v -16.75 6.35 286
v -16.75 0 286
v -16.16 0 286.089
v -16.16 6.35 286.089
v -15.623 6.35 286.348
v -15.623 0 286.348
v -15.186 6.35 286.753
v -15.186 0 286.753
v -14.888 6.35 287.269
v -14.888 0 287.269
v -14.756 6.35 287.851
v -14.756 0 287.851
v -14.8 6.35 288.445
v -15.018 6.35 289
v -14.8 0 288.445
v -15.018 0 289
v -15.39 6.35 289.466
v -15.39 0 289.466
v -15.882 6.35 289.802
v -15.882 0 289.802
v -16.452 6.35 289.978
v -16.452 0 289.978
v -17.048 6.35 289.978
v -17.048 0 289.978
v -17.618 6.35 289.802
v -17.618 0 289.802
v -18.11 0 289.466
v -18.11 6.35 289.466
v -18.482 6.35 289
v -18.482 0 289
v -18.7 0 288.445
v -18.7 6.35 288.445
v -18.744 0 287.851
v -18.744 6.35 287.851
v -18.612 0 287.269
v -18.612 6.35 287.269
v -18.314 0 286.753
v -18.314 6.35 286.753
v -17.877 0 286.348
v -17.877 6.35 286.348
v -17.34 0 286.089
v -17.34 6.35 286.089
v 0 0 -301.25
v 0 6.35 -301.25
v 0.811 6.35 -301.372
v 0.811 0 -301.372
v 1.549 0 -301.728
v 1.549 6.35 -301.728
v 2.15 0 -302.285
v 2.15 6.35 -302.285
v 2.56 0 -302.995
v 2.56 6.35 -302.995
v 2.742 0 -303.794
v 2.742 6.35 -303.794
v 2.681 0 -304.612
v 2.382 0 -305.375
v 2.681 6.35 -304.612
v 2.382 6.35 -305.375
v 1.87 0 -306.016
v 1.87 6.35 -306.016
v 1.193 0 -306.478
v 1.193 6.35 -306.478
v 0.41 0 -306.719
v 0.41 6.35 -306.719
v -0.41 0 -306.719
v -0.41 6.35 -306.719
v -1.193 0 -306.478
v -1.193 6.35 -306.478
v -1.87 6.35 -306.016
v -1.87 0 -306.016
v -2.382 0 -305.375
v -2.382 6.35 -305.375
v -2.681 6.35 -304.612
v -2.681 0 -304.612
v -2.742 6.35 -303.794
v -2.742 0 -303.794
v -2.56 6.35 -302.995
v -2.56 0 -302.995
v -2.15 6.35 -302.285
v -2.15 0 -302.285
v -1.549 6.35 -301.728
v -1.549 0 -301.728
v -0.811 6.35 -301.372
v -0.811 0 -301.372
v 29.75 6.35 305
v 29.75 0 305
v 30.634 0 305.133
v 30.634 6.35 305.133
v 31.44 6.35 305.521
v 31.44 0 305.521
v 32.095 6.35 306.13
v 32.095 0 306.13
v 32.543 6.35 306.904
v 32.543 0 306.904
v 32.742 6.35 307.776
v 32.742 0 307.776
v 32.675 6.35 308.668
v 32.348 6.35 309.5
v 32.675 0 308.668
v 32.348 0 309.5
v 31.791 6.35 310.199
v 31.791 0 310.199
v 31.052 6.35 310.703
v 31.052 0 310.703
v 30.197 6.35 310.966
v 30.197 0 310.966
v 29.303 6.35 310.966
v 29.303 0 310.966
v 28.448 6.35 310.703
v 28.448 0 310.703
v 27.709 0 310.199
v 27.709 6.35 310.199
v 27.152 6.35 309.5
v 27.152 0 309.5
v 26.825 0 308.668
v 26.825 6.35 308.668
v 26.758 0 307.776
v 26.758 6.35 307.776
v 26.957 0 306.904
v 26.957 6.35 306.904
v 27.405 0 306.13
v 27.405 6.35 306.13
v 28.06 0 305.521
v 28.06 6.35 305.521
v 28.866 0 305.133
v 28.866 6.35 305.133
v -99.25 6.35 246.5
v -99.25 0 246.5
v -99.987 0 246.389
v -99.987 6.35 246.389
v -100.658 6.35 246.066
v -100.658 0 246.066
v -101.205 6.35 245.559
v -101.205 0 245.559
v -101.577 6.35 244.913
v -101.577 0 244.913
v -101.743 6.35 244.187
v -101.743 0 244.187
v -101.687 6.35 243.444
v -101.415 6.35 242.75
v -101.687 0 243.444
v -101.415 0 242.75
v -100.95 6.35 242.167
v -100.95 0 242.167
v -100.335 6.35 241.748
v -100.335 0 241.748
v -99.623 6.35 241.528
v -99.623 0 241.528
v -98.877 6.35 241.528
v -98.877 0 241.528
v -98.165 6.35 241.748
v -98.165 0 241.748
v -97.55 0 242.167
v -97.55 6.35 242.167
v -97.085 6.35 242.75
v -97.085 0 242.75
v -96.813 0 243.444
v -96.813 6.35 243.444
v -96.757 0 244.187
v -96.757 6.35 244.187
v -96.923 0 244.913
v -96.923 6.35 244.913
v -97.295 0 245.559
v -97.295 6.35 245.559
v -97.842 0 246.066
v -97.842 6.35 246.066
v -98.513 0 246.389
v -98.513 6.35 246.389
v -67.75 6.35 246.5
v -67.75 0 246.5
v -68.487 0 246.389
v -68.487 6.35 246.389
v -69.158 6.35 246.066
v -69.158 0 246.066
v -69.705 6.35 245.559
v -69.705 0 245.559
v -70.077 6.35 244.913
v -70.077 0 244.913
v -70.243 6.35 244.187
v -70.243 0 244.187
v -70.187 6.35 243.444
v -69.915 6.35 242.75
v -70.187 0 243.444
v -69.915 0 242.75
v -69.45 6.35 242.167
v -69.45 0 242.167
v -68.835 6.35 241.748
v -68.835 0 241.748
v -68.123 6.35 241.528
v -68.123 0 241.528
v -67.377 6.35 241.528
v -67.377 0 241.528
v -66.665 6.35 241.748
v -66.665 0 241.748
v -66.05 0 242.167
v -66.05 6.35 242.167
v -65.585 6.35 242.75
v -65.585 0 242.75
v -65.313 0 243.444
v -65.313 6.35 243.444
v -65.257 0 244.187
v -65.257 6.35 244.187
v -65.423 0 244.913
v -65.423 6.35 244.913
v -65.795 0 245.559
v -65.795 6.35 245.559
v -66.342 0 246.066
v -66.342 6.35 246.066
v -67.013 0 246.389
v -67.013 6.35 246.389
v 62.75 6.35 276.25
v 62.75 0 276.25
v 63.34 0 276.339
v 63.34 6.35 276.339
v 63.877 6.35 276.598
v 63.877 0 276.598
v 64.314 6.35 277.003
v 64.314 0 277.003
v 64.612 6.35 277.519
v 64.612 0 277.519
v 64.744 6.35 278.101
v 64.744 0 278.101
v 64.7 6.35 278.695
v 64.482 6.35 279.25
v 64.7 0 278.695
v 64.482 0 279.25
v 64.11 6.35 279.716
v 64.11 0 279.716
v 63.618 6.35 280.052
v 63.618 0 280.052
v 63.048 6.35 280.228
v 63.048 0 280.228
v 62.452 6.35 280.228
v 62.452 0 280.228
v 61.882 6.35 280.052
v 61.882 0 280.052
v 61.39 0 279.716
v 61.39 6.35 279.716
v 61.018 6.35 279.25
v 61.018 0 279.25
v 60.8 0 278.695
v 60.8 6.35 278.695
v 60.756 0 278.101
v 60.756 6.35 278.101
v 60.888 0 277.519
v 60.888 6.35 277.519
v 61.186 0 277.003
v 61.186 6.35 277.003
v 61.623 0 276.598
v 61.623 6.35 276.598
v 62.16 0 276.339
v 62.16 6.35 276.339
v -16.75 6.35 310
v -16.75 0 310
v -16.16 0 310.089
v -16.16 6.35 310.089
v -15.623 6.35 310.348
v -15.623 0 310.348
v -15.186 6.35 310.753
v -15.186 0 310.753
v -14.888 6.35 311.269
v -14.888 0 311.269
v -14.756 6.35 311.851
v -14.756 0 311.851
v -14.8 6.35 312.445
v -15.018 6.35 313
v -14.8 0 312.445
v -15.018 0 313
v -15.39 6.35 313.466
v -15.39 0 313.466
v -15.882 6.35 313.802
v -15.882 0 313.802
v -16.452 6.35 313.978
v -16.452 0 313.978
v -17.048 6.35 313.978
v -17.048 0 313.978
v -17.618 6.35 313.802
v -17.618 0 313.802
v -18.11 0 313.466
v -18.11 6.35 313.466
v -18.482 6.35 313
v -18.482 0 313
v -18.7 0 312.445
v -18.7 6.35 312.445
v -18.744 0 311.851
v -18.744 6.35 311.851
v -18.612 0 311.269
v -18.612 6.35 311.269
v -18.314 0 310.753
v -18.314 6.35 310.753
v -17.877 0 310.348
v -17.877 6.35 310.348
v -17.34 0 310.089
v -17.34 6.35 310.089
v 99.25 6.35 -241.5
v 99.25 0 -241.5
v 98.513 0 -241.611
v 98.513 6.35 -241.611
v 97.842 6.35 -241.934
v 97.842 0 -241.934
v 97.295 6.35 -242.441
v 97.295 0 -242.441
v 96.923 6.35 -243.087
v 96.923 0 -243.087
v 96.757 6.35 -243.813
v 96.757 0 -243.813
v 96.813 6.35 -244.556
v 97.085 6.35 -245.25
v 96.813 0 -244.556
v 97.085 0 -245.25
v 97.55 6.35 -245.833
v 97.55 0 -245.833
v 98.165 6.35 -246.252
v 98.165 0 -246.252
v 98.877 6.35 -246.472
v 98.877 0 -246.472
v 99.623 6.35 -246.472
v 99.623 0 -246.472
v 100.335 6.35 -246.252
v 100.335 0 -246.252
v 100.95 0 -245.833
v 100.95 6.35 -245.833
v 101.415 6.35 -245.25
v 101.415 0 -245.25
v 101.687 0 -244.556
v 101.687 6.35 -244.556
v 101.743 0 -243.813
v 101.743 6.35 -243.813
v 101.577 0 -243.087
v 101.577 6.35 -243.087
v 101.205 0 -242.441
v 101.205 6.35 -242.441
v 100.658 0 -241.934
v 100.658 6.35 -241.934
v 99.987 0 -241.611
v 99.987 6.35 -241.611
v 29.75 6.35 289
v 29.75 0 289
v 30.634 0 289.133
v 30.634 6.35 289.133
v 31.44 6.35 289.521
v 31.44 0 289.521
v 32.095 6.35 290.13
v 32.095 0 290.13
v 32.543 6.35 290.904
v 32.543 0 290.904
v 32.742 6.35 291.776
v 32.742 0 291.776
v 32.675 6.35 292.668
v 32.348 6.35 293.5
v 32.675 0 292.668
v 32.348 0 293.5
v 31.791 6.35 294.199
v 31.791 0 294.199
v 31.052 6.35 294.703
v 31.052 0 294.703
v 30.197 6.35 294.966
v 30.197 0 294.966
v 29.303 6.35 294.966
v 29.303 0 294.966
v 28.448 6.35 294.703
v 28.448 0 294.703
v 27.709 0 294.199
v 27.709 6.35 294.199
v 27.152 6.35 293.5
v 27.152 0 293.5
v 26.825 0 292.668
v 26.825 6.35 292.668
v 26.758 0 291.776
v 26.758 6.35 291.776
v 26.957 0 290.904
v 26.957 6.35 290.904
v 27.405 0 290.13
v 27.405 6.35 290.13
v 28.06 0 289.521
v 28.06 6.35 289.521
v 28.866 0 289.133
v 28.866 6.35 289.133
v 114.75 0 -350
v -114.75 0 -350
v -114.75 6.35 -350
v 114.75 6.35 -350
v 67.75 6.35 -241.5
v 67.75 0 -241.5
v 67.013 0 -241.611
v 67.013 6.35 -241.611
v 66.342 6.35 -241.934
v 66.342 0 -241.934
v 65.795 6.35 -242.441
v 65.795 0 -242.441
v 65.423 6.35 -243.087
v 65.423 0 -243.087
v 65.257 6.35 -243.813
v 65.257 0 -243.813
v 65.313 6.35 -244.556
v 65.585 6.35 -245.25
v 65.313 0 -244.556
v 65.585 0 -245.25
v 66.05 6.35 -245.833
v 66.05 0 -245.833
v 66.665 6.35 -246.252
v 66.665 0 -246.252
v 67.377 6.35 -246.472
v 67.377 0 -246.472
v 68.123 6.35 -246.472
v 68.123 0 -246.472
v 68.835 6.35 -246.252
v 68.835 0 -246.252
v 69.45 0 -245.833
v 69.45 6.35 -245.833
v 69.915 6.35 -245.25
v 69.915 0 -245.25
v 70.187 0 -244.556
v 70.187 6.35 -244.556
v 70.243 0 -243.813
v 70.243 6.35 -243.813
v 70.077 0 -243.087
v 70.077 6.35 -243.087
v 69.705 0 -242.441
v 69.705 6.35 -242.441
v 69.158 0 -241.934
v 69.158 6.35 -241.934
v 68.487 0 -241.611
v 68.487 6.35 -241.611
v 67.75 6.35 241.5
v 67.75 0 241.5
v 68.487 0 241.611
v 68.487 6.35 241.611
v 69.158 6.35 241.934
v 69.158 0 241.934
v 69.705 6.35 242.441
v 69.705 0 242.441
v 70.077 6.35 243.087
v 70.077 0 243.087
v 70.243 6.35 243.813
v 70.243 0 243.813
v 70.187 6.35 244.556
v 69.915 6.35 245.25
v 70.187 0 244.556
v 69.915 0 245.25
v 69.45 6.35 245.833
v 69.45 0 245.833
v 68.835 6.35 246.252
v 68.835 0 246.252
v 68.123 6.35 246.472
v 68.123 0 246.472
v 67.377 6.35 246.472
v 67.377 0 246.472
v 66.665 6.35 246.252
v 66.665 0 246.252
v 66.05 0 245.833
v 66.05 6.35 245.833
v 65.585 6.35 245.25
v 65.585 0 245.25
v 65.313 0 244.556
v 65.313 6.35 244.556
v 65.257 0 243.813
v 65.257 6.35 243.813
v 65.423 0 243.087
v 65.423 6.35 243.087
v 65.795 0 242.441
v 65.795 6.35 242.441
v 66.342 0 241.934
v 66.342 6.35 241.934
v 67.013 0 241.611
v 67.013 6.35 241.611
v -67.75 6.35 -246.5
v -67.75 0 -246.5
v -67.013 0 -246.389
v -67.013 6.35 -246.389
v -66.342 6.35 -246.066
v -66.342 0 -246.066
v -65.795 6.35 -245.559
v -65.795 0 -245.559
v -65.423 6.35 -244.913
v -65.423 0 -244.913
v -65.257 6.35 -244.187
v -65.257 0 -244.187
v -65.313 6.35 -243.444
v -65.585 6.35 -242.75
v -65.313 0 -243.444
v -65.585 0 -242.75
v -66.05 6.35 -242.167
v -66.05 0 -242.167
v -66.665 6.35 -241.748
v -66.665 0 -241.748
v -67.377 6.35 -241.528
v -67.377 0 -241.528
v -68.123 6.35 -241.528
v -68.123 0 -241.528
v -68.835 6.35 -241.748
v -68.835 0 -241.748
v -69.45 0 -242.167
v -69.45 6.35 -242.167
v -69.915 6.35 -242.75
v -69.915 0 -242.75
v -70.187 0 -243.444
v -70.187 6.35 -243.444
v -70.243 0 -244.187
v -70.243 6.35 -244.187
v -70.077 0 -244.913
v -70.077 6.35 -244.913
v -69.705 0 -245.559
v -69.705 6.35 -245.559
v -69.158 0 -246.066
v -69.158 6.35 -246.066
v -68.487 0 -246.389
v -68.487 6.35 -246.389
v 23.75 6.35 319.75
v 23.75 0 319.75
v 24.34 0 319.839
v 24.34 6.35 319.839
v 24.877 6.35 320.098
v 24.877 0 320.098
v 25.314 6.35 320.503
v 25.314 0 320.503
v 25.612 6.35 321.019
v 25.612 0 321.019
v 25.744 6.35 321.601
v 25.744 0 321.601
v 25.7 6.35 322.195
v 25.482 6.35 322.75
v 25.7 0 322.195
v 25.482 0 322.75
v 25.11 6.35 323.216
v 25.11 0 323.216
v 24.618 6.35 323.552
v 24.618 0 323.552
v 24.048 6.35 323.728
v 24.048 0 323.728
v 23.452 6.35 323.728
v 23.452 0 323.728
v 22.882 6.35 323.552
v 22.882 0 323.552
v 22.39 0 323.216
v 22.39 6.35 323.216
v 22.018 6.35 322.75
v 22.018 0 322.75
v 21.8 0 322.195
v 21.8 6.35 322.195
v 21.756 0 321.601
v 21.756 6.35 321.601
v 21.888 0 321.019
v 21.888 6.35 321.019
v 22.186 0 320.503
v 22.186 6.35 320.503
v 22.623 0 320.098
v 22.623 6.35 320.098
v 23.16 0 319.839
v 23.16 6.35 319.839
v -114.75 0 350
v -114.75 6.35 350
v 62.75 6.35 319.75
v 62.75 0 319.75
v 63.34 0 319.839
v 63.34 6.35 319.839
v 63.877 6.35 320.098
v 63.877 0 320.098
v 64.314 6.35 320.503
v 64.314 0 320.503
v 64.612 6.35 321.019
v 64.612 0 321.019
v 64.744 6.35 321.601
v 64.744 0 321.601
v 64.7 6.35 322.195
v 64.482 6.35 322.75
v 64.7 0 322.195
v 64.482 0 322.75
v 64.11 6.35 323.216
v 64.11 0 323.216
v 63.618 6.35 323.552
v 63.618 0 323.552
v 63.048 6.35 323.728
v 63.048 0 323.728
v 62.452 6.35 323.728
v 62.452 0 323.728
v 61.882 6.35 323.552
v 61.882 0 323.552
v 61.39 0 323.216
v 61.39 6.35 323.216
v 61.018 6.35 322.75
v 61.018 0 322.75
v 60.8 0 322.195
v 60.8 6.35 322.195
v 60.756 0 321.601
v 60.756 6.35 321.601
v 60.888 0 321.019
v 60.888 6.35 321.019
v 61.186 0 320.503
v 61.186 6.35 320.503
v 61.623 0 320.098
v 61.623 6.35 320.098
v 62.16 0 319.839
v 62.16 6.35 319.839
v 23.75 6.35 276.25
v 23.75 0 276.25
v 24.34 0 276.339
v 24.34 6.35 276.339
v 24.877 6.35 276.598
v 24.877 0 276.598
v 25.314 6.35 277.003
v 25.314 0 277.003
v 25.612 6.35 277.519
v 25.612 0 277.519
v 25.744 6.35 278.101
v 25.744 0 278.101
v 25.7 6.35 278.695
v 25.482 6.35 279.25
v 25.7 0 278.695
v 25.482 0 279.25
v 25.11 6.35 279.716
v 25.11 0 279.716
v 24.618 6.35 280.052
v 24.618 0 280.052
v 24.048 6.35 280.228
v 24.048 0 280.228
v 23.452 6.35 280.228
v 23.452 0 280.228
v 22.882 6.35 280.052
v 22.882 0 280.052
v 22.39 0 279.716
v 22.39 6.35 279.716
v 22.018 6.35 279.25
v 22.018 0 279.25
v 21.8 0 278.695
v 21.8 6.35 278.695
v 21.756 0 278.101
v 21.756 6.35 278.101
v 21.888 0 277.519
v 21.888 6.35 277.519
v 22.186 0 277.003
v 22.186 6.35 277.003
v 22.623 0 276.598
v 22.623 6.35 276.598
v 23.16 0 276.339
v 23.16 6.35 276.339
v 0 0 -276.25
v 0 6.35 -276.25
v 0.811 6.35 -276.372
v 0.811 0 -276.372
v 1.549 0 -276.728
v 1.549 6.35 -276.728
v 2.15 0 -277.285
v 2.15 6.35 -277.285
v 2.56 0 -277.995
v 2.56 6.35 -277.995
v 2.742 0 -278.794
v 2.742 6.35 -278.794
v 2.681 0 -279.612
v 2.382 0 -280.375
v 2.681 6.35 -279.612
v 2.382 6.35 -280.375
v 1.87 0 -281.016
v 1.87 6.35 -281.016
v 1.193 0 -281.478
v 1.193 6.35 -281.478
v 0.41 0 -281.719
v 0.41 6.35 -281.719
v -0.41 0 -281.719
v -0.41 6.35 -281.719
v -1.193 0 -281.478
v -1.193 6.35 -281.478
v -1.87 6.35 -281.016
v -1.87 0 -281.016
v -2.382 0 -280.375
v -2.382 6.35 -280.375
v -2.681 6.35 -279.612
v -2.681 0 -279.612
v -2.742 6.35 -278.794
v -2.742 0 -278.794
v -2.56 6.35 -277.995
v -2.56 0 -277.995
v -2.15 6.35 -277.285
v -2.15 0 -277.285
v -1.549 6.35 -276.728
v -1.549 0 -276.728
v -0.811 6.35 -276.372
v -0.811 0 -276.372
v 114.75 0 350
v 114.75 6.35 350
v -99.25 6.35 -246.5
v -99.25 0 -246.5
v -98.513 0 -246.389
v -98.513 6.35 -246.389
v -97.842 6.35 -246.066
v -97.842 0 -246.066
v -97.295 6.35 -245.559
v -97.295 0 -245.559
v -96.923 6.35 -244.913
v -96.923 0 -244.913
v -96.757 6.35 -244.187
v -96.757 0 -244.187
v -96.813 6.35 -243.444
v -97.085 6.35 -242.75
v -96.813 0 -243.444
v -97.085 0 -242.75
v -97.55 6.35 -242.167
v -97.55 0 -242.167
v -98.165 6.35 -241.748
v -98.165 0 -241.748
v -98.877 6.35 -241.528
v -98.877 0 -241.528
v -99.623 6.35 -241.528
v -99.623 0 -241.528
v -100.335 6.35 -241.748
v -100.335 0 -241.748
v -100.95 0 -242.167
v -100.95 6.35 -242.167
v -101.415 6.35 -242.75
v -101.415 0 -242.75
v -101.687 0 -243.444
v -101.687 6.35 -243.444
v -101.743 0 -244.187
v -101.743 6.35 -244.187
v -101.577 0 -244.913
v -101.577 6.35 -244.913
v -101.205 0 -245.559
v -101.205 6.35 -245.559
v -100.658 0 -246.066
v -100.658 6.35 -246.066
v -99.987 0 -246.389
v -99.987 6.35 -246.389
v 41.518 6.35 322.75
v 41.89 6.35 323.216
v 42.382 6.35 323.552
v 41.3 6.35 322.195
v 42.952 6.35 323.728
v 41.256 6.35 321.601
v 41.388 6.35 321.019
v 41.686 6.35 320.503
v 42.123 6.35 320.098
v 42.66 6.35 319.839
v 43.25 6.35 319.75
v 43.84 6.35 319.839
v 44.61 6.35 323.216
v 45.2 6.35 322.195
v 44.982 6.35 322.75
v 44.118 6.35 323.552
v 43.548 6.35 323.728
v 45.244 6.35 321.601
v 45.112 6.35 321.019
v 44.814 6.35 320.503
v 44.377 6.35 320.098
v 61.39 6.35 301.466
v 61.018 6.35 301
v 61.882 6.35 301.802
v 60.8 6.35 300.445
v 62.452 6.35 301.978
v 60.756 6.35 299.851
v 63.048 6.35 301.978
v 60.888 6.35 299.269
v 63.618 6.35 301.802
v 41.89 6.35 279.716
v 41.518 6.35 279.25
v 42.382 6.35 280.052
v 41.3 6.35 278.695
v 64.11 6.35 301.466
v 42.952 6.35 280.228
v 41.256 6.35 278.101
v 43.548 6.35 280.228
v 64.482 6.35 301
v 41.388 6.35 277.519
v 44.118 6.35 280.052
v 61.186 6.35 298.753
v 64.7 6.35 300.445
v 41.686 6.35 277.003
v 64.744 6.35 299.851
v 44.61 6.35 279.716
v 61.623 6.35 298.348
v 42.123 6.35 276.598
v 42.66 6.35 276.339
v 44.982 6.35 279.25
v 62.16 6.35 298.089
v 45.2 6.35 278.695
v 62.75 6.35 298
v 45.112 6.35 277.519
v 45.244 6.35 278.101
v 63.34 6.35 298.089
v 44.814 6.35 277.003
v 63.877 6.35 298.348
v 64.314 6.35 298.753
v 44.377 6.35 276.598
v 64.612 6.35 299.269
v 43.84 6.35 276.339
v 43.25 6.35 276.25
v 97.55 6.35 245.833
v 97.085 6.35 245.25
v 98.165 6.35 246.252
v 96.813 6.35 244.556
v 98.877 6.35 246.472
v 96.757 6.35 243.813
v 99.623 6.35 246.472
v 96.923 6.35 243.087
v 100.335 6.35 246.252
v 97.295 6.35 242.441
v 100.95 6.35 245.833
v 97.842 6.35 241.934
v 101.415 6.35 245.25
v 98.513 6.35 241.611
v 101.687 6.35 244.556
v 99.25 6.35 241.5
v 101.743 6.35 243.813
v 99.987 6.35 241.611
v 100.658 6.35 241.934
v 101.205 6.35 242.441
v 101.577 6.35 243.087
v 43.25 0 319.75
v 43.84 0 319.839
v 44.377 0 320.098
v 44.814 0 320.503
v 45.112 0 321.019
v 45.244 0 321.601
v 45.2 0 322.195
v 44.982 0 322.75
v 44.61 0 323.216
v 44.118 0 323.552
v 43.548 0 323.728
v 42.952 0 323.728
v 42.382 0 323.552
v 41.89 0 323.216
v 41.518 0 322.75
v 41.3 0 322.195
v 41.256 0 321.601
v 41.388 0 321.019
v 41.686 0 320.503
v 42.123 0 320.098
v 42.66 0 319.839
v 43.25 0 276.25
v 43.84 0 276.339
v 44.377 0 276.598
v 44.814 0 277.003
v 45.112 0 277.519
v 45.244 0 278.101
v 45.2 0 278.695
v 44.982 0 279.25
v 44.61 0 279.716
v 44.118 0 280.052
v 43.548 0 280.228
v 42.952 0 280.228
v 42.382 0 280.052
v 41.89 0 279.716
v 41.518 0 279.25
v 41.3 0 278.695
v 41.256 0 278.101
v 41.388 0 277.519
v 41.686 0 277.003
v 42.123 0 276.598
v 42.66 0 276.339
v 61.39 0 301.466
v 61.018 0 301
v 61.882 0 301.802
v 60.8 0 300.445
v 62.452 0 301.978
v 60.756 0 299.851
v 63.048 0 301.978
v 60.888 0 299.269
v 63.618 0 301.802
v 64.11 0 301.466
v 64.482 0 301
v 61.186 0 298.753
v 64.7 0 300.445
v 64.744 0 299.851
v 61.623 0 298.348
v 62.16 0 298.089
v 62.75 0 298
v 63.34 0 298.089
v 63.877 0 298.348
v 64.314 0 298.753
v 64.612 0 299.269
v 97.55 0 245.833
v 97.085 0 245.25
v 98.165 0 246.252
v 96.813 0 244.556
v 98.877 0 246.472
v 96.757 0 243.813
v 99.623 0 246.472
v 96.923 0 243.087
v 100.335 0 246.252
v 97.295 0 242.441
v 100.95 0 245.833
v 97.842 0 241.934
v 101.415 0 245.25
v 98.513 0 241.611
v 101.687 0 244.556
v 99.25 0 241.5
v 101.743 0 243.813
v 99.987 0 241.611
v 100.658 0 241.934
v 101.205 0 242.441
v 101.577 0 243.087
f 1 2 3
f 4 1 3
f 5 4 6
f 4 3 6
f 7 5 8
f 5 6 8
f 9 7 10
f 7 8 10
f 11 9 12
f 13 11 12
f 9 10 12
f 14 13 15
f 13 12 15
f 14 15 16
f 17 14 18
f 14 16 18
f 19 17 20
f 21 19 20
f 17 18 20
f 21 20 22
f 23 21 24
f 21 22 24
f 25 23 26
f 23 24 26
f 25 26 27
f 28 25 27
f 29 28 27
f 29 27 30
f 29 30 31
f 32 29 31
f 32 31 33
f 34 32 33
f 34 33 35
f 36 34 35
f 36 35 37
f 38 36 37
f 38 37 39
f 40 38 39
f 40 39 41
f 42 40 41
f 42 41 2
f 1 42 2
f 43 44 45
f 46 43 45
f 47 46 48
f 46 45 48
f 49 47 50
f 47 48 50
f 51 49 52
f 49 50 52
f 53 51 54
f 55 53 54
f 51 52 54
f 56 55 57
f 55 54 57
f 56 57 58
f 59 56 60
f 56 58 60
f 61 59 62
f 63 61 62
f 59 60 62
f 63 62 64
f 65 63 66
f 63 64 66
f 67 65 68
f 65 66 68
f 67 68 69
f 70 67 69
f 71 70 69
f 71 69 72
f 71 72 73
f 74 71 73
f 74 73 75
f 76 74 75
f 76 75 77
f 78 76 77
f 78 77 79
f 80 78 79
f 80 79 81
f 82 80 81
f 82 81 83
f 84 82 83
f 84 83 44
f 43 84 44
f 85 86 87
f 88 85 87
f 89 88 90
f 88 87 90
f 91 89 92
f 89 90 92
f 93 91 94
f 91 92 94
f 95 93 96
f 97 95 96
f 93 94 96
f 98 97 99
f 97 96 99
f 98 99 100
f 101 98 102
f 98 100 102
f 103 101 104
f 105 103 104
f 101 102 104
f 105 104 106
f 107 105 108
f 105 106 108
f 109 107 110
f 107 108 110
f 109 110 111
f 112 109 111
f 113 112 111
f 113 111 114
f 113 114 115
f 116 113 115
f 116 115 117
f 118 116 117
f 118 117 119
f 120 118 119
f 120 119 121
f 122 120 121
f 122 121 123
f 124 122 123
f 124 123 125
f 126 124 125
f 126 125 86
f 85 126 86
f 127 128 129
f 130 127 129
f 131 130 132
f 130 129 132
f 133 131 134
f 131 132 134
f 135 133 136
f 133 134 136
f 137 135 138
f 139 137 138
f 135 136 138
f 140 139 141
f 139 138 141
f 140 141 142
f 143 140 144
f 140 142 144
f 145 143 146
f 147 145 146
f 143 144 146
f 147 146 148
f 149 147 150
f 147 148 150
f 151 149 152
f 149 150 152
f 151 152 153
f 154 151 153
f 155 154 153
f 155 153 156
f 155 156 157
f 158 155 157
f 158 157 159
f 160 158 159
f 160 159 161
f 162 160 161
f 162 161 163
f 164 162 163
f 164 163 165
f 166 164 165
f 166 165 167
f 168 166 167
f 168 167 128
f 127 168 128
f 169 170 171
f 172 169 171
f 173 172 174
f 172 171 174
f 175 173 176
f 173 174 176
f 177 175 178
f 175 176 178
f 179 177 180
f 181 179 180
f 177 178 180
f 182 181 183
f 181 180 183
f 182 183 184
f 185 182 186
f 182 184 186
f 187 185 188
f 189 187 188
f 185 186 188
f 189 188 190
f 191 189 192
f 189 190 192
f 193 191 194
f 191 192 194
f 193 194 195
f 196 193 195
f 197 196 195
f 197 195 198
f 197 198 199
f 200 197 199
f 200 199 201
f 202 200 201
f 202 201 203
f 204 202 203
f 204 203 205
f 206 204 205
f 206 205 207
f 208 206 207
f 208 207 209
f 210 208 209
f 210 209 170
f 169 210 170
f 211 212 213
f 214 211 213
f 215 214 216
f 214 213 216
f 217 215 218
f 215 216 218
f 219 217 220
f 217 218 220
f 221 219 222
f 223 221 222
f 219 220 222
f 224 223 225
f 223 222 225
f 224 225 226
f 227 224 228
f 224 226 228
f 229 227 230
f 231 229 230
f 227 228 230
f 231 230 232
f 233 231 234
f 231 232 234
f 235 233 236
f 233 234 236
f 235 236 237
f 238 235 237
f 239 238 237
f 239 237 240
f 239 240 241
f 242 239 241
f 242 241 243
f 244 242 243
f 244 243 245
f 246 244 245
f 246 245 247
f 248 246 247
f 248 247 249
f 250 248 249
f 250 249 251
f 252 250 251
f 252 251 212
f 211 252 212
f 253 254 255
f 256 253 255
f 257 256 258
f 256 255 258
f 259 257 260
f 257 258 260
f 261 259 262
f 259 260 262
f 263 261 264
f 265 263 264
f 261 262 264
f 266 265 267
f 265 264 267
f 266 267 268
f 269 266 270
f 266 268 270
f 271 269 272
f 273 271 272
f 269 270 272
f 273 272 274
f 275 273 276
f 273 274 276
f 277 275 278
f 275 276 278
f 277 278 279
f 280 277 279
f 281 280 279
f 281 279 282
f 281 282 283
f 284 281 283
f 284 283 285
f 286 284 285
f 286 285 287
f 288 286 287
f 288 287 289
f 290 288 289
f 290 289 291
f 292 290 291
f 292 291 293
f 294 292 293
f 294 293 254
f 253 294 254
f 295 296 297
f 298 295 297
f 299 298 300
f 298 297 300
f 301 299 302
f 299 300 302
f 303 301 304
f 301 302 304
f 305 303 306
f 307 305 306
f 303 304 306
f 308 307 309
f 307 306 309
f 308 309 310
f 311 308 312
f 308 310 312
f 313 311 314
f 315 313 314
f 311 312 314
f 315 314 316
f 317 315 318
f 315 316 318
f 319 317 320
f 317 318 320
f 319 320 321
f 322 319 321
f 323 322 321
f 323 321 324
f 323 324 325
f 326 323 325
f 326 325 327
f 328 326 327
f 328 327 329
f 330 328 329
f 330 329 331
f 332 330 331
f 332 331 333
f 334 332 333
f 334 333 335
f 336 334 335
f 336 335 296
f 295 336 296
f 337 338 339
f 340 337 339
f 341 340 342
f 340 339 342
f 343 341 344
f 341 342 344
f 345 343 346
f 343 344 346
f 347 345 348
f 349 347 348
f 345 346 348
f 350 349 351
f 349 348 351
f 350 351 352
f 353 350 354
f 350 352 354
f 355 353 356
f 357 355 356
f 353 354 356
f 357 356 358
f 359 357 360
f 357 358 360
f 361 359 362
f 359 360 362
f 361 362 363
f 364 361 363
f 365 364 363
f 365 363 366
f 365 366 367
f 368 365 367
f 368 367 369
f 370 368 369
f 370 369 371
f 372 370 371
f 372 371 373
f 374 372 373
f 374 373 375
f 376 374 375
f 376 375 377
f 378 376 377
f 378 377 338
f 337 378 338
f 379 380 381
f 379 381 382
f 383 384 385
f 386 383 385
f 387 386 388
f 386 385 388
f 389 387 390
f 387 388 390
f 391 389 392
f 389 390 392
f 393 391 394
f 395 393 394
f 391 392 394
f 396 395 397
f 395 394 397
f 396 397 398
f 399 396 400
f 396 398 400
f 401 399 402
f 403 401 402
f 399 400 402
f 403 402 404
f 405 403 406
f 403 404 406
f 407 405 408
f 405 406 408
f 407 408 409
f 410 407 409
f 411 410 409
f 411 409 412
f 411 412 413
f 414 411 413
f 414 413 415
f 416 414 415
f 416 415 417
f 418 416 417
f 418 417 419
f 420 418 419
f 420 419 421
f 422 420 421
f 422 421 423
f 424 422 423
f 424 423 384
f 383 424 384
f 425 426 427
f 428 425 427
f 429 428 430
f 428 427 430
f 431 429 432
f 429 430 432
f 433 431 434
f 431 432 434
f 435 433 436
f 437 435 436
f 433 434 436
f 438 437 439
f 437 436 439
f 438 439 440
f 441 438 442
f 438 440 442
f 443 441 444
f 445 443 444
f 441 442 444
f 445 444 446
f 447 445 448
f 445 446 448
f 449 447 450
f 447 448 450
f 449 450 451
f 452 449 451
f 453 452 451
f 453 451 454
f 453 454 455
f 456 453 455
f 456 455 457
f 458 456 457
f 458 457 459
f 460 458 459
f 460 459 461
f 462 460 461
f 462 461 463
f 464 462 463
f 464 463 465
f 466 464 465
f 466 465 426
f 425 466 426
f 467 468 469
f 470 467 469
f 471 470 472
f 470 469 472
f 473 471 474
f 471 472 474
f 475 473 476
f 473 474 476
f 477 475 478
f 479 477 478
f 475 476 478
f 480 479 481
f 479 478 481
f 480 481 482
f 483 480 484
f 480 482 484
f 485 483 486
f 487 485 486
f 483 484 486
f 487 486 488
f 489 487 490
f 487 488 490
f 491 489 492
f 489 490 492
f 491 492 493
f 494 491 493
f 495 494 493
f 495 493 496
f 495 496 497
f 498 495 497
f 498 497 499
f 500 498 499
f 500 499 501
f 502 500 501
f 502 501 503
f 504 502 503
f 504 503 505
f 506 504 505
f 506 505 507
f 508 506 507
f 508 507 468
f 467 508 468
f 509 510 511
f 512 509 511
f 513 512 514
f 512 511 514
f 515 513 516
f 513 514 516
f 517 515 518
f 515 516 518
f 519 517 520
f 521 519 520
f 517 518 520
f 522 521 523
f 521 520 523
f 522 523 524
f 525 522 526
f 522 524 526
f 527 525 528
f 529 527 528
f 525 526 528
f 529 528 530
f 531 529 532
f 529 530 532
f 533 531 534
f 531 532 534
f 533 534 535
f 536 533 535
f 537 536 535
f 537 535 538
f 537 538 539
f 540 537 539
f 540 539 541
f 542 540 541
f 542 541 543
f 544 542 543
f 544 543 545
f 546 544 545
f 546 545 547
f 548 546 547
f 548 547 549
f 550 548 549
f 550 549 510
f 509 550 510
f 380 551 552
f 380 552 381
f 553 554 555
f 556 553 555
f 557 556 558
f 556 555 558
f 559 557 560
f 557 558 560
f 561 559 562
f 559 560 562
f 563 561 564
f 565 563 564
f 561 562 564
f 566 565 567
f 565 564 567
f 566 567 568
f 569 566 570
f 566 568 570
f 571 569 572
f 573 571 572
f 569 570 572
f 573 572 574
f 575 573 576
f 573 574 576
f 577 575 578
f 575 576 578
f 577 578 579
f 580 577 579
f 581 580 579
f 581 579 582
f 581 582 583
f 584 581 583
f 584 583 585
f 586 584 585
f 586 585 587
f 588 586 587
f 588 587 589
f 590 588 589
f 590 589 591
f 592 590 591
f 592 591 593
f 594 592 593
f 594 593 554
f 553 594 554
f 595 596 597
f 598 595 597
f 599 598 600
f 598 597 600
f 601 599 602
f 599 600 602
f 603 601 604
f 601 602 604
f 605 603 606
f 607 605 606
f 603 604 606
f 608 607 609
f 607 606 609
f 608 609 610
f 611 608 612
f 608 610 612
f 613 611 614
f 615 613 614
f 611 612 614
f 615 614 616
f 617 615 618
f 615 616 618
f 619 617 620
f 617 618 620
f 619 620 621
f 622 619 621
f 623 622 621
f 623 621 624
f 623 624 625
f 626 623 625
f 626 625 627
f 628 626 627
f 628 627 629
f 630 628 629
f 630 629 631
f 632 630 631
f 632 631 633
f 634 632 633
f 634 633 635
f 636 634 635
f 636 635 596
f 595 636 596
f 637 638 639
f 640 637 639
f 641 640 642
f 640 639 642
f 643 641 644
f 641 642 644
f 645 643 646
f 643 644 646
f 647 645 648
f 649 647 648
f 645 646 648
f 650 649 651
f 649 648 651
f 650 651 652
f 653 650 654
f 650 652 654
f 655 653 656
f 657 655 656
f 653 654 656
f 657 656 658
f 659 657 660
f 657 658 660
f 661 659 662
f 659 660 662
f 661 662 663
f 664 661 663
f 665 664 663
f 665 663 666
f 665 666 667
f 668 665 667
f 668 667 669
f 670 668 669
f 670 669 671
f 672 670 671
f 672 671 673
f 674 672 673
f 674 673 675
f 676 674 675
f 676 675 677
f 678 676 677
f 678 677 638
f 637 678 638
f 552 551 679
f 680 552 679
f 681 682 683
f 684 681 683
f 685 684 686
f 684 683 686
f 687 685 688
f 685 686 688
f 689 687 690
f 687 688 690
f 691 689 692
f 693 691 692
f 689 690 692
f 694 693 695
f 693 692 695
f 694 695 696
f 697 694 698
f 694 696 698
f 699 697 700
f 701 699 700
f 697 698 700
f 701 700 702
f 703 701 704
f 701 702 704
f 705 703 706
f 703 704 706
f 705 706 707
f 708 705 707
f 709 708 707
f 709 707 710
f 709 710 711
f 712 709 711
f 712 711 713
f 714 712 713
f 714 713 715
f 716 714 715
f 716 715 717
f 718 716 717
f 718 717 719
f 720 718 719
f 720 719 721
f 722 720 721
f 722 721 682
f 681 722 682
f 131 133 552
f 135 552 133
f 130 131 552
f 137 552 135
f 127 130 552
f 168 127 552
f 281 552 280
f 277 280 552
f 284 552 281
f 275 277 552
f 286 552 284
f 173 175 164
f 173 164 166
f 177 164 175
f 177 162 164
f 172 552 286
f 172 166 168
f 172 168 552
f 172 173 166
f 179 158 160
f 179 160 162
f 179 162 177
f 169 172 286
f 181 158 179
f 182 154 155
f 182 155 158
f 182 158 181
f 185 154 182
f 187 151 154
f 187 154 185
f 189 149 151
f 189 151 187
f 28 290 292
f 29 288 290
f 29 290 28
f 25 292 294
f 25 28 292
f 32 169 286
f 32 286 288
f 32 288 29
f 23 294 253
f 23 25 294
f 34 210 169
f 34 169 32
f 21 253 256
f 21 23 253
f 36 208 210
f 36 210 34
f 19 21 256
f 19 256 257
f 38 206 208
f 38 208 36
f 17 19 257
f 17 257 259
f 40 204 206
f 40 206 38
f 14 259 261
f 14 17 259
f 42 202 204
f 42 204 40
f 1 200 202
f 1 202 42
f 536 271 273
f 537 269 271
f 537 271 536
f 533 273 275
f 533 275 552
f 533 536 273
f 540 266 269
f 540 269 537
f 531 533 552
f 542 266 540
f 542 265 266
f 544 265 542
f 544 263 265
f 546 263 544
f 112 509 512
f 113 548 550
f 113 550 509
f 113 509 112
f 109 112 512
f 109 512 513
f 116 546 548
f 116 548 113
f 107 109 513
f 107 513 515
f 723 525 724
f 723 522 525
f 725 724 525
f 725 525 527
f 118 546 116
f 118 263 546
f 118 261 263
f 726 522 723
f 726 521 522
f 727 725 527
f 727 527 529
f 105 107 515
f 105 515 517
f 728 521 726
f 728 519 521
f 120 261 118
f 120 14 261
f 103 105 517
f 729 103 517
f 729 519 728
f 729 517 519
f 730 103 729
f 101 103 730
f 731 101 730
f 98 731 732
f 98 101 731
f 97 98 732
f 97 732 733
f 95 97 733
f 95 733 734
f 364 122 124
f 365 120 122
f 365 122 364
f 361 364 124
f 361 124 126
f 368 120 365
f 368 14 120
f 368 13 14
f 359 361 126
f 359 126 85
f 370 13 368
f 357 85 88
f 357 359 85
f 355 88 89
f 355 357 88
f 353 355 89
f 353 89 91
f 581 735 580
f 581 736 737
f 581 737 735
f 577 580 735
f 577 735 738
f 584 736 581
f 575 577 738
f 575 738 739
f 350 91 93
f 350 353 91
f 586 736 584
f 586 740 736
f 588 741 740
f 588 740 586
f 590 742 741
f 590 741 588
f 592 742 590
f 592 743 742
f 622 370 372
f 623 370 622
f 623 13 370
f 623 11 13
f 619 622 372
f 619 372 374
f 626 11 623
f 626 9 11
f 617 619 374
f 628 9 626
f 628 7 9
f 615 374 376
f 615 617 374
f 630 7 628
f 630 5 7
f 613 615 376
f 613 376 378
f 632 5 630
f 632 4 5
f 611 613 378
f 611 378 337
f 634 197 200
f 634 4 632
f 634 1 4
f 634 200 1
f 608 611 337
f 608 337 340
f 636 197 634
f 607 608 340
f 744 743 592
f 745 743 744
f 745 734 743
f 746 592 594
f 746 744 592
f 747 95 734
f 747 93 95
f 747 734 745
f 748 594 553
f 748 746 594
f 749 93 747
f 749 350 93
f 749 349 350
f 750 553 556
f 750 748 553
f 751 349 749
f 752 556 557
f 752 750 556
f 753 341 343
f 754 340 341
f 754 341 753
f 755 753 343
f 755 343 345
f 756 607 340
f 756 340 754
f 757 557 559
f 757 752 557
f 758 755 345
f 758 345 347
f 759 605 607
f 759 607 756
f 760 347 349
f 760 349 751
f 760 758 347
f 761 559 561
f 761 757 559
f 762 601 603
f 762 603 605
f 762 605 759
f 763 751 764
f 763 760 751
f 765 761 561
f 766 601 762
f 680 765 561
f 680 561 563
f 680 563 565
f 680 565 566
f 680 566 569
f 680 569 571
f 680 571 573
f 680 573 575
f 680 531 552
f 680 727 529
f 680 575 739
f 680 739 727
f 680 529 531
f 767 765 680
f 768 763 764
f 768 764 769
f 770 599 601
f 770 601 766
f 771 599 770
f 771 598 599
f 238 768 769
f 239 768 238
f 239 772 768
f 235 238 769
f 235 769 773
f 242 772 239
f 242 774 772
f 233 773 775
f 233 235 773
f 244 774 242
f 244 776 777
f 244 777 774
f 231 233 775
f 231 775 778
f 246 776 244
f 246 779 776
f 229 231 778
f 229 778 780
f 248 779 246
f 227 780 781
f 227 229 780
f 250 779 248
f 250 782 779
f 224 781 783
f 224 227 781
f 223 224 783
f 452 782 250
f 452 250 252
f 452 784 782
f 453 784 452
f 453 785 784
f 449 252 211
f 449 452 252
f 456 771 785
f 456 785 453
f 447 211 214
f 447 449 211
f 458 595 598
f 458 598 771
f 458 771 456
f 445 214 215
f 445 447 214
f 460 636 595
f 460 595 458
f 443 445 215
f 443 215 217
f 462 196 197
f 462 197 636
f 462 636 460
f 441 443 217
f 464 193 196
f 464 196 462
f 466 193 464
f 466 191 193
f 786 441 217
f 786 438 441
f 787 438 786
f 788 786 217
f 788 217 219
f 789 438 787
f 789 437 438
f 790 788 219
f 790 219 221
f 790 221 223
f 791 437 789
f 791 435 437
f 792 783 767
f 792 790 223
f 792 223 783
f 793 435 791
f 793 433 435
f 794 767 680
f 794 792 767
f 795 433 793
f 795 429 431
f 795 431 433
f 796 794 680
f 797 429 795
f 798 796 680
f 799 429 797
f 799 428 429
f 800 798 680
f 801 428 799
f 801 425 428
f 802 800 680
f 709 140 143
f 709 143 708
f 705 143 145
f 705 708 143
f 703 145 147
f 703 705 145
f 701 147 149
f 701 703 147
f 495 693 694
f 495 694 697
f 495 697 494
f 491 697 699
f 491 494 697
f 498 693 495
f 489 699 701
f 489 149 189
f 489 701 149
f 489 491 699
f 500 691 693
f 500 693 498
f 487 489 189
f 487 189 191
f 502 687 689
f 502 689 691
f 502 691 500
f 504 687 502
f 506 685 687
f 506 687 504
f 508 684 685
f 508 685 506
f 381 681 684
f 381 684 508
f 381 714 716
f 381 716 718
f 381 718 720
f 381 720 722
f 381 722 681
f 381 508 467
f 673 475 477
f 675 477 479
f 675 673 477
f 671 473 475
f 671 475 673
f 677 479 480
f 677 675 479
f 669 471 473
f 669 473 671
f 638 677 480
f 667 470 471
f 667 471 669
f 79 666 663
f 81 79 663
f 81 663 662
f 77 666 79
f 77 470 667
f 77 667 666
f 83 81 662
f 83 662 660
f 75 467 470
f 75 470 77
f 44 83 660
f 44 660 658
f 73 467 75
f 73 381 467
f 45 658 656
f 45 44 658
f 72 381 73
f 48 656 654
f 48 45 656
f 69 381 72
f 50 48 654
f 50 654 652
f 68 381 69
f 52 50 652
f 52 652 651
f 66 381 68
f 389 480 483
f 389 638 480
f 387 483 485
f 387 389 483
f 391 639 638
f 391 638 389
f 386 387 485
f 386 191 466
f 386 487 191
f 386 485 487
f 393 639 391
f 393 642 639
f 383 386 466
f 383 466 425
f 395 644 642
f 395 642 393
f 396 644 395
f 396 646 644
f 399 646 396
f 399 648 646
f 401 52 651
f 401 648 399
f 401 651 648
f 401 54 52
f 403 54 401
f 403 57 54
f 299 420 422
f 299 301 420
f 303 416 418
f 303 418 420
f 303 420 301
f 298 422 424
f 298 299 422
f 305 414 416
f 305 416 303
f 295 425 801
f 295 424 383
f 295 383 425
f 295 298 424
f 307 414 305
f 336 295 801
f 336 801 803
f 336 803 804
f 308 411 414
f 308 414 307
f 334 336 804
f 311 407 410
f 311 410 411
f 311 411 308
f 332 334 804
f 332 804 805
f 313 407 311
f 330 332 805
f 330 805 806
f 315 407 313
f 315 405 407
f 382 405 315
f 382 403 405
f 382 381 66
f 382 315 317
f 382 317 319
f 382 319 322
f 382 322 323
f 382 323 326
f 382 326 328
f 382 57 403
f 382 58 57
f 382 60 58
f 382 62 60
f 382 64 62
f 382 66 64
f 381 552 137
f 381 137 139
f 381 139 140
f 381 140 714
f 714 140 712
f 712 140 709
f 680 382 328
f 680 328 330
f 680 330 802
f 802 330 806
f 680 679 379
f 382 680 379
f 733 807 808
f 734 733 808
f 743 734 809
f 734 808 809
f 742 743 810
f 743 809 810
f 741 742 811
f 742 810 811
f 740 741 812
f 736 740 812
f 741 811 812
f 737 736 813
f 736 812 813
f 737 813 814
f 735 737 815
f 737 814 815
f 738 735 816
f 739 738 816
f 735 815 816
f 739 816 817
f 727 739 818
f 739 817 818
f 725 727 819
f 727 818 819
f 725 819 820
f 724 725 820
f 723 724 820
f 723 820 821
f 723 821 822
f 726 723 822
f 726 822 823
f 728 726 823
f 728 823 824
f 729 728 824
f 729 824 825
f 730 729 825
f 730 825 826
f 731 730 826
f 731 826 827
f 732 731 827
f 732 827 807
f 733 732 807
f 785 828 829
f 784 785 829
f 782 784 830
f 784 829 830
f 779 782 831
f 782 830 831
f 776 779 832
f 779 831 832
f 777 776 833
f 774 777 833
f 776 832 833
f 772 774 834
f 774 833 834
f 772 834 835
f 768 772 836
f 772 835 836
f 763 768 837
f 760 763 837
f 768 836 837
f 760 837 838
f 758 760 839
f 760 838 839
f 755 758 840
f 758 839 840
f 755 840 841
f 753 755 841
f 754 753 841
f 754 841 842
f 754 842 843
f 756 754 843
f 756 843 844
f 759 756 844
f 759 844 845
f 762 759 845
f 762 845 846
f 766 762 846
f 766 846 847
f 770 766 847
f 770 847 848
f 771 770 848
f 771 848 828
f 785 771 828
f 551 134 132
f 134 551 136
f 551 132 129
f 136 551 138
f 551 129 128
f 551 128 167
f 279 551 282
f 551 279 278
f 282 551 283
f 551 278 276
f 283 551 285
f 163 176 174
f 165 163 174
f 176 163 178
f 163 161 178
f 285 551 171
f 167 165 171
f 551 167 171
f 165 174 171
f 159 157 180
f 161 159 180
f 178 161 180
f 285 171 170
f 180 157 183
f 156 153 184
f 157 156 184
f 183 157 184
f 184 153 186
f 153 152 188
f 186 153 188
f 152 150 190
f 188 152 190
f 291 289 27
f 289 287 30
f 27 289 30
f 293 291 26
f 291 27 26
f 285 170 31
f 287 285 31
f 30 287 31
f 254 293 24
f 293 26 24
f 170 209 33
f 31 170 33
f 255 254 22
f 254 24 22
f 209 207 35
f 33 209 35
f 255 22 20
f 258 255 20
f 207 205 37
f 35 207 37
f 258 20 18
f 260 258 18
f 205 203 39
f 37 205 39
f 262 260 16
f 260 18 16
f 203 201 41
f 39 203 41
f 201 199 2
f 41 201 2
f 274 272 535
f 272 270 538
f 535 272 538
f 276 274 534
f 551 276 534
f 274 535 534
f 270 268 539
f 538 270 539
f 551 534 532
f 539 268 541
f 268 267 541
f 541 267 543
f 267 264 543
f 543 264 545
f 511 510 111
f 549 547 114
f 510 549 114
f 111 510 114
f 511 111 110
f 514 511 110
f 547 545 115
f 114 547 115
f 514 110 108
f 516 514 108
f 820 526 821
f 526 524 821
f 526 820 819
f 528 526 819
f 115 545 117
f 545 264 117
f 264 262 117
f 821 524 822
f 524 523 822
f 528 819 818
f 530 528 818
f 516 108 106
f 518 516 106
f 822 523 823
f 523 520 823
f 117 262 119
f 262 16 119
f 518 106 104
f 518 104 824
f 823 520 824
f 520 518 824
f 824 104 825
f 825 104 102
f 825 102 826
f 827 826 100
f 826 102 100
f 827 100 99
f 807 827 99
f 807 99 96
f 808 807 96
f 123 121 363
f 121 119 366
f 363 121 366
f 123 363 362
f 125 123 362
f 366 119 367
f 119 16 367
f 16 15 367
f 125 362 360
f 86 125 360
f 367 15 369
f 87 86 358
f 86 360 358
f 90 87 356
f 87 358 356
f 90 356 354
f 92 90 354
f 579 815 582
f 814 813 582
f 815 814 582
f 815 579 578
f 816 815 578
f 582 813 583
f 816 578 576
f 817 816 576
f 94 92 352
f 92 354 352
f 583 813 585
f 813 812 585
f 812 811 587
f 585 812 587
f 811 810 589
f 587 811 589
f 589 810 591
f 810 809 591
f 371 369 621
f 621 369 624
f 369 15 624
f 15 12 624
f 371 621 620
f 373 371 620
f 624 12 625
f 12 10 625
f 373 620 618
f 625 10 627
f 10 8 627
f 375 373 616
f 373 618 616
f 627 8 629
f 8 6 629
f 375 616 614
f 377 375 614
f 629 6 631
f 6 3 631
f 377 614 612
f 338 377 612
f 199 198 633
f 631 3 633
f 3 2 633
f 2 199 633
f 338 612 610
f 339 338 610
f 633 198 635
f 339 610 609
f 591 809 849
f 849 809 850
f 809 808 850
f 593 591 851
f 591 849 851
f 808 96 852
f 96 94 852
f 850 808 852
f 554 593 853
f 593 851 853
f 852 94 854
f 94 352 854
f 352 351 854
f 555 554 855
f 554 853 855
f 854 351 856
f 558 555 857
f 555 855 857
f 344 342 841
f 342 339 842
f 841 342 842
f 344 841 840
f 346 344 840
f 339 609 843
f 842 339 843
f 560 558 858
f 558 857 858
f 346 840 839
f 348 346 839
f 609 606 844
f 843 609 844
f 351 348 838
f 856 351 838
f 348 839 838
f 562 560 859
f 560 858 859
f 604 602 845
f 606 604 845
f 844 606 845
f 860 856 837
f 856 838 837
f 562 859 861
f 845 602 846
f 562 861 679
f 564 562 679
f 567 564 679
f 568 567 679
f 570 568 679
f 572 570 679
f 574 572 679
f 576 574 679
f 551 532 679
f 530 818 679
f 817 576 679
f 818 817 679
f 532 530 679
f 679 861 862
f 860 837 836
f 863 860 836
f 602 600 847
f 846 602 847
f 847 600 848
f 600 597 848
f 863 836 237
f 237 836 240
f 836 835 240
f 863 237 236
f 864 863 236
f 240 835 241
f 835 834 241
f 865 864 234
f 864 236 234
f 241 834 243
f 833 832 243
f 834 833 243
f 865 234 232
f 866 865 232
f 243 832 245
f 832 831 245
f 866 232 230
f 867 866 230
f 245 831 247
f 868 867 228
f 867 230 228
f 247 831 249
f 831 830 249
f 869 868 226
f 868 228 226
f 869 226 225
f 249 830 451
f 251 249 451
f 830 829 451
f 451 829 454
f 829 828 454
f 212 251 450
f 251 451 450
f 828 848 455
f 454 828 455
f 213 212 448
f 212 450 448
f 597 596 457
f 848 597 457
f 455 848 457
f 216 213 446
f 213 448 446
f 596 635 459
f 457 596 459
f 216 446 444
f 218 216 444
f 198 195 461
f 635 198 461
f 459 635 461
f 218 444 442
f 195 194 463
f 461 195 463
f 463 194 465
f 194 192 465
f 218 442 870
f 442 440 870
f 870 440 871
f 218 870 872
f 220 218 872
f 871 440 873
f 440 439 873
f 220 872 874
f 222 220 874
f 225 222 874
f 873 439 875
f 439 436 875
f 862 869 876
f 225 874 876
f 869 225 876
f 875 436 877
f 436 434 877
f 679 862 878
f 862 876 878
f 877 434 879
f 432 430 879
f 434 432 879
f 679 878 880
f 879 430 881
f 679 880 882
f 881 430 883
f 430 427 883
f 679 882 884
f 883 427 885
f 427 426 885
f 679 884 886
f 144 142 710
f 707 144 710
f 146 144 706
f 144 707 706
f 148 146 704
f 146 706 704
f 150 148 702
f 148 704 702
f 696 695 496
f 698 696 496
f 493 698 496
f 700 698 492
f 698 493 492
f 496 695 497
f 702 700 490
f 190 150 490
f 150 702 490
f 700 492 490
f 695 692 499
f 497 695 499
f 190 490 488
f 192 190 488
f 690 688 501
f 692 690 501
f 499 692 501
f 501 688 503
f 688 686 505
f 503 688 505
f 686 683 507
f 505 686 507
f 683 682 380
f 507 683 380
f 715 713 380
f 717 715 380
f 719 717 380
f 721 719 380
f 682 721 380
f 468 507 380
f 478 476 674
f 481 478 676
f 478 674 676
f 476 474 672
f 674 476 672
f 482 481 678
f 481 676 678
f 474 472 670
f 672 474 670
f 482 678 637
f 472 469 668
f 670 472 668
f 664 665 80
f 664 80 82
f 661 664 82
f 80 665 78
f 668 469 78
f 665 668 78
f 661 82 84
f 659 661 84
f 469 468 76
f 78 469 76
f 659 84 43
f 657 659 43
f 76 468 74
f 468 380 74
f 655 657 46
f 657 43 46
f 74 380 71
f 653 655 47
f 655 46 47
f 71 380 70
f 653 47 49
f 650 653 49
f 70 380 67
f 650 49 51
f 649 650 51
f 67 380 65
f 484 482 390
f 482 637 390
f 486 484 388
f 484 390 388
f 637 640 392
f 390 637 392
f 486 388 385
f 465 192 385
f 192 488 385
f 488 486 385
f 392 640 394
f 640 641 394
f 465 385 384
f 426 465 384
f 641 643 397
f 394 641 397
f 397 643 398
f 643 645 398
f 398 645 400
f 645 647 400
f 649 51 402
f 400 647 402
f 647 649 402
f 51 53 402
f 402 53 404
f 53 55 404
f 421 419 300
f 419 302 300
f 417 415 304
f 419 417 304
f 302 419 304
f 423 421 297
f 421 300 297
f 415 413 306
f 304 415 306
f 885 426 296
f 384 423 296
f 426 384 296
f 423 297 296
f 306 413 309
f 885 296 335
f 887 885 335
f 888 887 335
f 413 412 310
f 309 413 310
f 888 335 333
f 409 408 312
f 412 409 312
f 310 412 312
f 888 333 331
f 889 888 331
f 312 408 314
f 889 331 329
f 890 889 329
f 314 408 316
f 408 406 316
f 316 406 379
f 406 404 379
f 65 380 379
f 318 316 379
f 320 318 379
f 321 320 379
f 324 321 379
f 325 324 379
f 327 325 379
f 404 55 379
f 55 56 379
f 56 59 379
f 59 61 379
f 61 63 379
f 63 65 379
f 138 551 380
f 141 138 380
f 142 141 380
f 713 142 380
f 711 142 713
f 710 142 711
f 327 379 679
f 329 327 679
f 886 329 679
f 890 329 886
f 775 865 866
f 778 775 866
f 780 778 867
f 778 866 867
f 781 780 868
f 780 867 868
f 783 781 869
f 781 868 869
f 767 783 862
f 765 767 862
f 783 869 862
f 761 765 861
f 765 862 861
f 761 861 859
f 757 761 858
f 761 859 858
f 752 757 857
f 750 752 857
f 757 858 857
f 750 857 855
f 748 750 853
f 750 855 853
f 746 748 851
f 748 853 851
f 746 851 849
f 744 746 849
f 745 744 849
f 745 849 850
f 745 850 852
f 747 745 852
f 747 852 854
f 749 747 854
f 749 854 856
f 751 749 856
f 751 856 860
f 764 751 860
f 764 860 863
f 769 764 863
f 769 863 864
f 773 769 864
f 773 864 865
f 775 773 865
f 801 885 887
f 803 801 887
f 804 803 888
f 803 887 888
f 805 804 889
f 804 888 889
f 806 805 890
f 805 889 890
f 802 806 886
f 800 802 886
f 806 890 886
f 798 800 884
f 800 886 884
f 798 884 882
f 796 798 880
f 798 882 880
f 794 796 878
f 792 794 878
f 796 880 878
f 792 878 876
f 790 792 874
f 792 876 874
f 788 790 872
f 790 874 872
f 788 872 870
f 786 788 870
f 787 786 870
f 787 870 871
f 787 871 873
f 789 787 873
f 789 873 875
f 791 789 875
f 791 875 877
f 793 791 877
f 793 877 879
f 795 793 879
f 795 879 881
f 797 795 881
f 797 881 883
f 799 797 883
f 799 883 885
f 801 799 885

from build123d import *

# Parameters (mm, degrees)
ESQUISSE1_W             = 229.5
ESQUISSE1_H             = 700
BOSS_EXTRU_1_DEPTH      = 6.35
ESQUISSE2_R             = 2
ESQUISSE2_R_2           = 3
ESQUISSE2_R_3           = 2.5
ENL_V_MAT_EXTRU_1_DEPTH = 369.385511387
ESQUISSE3_R             = 2.75
ENL_V_MAT_EXTRU_2_DEPTH = 369.385511387


with BuildPart() as part:
    # Esquisse1 → Boss.-Extru.1 (new body)
    with BuildSketch(Plane(origin=(0, 0, 0), x_dir=(1, 0, 0), z_dir=(0, 1, 0))):
        Rectangle(ESQUISSE1_W, ESQUISSE1_H)
    extrude(amount=BOSS_EXTRU_1_DEPTH)

    # Esquisse2 → Enlèv. mat.-Extru.1 (cut, through all)
    with BuildSketch(Plane.XZ):
        with Locations(Location((-16.75, 312, 0), (0, 0, 270))):
            Circle(ESQUISSE2_R)
        with Locations(Location((-16.75, 288, 0), (0, 0, 270))):
            Circle(ESQUISSE2_R)
        with Locations(Location((23.75, 321.75, 0), (0, 0, 270))):
            Circle(ESQUISSE2_R)
        with Locations(Location((23.75, 278.25, 0), (0, 0, 270))):
            Circle(ESQUISSE2_R)
        with Locations(Location((43.25, 278.25, 0), (0, 0, 270))):
            Circle(ESQUISSE2_R)
        with Locations(Location((43.25, 321.75, 0), (0, 0, 270))):
            Circle(ESQUISSE2_R)
        with Locations(Location((62.75, 321.75, 0), (0, 0, 270))):
            Circle(ESQUISSE2_R)
        with Locations(Location((62.75, 300, 0), (0, 0, 270))):
            Circle(ESQUISSE2_R)
        with Locations(Location((62.75, 278.25, 0), (0, 0, 270))):
            Circle(ESQUISSE2_R)
        with Locations(Location((29.75, 292, 0), (0, 0, 270))):
            Circle(ESQUISSE2_R_2)
        with Locations(Location((29.75, 308, 0), (0, 0, 270))):
            Circle(ESQUISSE2_R_2)
        with Locations(Location((67.75, 244, 0), (0, 0, 270))):
            Circle(ESQUISSE2_R_3)
        with Locations(Location((99.25, 244, 0), (0, 0, 270))):
            Circle(ESQUISSE2_R_3)
        with Locations(Location((67.75, -244, 0), (0, 0, 90))):
            Circle(ESQUISSE2_R_3)
        with Locations(Location((99.25, -244, 0), (0, 0, 90))):
            Circle(ESQUISSE2_R_3)
        with Locations(Location((-99.25, -244, 0), (0, 0, 270))):
            Circle(ESQUISSE2_R_3)
        with Locations(Location((-67.75, -244, 0), (0, 0, 270))):
            Circle(ESQUISSE2_R_3)
        with Locations(Location((-99.25, 244, 0), (0, 0, 90))):
            Circle(ESQUISSE2_R_3)
        with Locations(Location((-67.75, 244, 0), (0, 0, 90))):
            Circle(ESQUISSE2_R_3)
    extrude(amount=-ENL_V_MAT_EXTRU_1_DEPTH, mode=Mode.SUBTRACT)

    # Esquisse3 → Enlèv. mat.-Extru.2 (cut, through all)
    with BuildSketch(Plane(origin=(0, 6.35, 0), x_dir=(1, 0, 0), z_dir=(0, 1, 0))):
        with Locations(Location((0, 279, 0), (0, 0, 270))):
            Circle(ESQUISSE3_R)
        with Locations(Location((0, 304, 0), (0, 0, 270))):
            Circle(ESQUISSE3_R)
    extrude(amount=-ENL_V_MAT_EXTRU_2_DEPTH, mode=Mode.SUBTRACT)


solid = part.part
